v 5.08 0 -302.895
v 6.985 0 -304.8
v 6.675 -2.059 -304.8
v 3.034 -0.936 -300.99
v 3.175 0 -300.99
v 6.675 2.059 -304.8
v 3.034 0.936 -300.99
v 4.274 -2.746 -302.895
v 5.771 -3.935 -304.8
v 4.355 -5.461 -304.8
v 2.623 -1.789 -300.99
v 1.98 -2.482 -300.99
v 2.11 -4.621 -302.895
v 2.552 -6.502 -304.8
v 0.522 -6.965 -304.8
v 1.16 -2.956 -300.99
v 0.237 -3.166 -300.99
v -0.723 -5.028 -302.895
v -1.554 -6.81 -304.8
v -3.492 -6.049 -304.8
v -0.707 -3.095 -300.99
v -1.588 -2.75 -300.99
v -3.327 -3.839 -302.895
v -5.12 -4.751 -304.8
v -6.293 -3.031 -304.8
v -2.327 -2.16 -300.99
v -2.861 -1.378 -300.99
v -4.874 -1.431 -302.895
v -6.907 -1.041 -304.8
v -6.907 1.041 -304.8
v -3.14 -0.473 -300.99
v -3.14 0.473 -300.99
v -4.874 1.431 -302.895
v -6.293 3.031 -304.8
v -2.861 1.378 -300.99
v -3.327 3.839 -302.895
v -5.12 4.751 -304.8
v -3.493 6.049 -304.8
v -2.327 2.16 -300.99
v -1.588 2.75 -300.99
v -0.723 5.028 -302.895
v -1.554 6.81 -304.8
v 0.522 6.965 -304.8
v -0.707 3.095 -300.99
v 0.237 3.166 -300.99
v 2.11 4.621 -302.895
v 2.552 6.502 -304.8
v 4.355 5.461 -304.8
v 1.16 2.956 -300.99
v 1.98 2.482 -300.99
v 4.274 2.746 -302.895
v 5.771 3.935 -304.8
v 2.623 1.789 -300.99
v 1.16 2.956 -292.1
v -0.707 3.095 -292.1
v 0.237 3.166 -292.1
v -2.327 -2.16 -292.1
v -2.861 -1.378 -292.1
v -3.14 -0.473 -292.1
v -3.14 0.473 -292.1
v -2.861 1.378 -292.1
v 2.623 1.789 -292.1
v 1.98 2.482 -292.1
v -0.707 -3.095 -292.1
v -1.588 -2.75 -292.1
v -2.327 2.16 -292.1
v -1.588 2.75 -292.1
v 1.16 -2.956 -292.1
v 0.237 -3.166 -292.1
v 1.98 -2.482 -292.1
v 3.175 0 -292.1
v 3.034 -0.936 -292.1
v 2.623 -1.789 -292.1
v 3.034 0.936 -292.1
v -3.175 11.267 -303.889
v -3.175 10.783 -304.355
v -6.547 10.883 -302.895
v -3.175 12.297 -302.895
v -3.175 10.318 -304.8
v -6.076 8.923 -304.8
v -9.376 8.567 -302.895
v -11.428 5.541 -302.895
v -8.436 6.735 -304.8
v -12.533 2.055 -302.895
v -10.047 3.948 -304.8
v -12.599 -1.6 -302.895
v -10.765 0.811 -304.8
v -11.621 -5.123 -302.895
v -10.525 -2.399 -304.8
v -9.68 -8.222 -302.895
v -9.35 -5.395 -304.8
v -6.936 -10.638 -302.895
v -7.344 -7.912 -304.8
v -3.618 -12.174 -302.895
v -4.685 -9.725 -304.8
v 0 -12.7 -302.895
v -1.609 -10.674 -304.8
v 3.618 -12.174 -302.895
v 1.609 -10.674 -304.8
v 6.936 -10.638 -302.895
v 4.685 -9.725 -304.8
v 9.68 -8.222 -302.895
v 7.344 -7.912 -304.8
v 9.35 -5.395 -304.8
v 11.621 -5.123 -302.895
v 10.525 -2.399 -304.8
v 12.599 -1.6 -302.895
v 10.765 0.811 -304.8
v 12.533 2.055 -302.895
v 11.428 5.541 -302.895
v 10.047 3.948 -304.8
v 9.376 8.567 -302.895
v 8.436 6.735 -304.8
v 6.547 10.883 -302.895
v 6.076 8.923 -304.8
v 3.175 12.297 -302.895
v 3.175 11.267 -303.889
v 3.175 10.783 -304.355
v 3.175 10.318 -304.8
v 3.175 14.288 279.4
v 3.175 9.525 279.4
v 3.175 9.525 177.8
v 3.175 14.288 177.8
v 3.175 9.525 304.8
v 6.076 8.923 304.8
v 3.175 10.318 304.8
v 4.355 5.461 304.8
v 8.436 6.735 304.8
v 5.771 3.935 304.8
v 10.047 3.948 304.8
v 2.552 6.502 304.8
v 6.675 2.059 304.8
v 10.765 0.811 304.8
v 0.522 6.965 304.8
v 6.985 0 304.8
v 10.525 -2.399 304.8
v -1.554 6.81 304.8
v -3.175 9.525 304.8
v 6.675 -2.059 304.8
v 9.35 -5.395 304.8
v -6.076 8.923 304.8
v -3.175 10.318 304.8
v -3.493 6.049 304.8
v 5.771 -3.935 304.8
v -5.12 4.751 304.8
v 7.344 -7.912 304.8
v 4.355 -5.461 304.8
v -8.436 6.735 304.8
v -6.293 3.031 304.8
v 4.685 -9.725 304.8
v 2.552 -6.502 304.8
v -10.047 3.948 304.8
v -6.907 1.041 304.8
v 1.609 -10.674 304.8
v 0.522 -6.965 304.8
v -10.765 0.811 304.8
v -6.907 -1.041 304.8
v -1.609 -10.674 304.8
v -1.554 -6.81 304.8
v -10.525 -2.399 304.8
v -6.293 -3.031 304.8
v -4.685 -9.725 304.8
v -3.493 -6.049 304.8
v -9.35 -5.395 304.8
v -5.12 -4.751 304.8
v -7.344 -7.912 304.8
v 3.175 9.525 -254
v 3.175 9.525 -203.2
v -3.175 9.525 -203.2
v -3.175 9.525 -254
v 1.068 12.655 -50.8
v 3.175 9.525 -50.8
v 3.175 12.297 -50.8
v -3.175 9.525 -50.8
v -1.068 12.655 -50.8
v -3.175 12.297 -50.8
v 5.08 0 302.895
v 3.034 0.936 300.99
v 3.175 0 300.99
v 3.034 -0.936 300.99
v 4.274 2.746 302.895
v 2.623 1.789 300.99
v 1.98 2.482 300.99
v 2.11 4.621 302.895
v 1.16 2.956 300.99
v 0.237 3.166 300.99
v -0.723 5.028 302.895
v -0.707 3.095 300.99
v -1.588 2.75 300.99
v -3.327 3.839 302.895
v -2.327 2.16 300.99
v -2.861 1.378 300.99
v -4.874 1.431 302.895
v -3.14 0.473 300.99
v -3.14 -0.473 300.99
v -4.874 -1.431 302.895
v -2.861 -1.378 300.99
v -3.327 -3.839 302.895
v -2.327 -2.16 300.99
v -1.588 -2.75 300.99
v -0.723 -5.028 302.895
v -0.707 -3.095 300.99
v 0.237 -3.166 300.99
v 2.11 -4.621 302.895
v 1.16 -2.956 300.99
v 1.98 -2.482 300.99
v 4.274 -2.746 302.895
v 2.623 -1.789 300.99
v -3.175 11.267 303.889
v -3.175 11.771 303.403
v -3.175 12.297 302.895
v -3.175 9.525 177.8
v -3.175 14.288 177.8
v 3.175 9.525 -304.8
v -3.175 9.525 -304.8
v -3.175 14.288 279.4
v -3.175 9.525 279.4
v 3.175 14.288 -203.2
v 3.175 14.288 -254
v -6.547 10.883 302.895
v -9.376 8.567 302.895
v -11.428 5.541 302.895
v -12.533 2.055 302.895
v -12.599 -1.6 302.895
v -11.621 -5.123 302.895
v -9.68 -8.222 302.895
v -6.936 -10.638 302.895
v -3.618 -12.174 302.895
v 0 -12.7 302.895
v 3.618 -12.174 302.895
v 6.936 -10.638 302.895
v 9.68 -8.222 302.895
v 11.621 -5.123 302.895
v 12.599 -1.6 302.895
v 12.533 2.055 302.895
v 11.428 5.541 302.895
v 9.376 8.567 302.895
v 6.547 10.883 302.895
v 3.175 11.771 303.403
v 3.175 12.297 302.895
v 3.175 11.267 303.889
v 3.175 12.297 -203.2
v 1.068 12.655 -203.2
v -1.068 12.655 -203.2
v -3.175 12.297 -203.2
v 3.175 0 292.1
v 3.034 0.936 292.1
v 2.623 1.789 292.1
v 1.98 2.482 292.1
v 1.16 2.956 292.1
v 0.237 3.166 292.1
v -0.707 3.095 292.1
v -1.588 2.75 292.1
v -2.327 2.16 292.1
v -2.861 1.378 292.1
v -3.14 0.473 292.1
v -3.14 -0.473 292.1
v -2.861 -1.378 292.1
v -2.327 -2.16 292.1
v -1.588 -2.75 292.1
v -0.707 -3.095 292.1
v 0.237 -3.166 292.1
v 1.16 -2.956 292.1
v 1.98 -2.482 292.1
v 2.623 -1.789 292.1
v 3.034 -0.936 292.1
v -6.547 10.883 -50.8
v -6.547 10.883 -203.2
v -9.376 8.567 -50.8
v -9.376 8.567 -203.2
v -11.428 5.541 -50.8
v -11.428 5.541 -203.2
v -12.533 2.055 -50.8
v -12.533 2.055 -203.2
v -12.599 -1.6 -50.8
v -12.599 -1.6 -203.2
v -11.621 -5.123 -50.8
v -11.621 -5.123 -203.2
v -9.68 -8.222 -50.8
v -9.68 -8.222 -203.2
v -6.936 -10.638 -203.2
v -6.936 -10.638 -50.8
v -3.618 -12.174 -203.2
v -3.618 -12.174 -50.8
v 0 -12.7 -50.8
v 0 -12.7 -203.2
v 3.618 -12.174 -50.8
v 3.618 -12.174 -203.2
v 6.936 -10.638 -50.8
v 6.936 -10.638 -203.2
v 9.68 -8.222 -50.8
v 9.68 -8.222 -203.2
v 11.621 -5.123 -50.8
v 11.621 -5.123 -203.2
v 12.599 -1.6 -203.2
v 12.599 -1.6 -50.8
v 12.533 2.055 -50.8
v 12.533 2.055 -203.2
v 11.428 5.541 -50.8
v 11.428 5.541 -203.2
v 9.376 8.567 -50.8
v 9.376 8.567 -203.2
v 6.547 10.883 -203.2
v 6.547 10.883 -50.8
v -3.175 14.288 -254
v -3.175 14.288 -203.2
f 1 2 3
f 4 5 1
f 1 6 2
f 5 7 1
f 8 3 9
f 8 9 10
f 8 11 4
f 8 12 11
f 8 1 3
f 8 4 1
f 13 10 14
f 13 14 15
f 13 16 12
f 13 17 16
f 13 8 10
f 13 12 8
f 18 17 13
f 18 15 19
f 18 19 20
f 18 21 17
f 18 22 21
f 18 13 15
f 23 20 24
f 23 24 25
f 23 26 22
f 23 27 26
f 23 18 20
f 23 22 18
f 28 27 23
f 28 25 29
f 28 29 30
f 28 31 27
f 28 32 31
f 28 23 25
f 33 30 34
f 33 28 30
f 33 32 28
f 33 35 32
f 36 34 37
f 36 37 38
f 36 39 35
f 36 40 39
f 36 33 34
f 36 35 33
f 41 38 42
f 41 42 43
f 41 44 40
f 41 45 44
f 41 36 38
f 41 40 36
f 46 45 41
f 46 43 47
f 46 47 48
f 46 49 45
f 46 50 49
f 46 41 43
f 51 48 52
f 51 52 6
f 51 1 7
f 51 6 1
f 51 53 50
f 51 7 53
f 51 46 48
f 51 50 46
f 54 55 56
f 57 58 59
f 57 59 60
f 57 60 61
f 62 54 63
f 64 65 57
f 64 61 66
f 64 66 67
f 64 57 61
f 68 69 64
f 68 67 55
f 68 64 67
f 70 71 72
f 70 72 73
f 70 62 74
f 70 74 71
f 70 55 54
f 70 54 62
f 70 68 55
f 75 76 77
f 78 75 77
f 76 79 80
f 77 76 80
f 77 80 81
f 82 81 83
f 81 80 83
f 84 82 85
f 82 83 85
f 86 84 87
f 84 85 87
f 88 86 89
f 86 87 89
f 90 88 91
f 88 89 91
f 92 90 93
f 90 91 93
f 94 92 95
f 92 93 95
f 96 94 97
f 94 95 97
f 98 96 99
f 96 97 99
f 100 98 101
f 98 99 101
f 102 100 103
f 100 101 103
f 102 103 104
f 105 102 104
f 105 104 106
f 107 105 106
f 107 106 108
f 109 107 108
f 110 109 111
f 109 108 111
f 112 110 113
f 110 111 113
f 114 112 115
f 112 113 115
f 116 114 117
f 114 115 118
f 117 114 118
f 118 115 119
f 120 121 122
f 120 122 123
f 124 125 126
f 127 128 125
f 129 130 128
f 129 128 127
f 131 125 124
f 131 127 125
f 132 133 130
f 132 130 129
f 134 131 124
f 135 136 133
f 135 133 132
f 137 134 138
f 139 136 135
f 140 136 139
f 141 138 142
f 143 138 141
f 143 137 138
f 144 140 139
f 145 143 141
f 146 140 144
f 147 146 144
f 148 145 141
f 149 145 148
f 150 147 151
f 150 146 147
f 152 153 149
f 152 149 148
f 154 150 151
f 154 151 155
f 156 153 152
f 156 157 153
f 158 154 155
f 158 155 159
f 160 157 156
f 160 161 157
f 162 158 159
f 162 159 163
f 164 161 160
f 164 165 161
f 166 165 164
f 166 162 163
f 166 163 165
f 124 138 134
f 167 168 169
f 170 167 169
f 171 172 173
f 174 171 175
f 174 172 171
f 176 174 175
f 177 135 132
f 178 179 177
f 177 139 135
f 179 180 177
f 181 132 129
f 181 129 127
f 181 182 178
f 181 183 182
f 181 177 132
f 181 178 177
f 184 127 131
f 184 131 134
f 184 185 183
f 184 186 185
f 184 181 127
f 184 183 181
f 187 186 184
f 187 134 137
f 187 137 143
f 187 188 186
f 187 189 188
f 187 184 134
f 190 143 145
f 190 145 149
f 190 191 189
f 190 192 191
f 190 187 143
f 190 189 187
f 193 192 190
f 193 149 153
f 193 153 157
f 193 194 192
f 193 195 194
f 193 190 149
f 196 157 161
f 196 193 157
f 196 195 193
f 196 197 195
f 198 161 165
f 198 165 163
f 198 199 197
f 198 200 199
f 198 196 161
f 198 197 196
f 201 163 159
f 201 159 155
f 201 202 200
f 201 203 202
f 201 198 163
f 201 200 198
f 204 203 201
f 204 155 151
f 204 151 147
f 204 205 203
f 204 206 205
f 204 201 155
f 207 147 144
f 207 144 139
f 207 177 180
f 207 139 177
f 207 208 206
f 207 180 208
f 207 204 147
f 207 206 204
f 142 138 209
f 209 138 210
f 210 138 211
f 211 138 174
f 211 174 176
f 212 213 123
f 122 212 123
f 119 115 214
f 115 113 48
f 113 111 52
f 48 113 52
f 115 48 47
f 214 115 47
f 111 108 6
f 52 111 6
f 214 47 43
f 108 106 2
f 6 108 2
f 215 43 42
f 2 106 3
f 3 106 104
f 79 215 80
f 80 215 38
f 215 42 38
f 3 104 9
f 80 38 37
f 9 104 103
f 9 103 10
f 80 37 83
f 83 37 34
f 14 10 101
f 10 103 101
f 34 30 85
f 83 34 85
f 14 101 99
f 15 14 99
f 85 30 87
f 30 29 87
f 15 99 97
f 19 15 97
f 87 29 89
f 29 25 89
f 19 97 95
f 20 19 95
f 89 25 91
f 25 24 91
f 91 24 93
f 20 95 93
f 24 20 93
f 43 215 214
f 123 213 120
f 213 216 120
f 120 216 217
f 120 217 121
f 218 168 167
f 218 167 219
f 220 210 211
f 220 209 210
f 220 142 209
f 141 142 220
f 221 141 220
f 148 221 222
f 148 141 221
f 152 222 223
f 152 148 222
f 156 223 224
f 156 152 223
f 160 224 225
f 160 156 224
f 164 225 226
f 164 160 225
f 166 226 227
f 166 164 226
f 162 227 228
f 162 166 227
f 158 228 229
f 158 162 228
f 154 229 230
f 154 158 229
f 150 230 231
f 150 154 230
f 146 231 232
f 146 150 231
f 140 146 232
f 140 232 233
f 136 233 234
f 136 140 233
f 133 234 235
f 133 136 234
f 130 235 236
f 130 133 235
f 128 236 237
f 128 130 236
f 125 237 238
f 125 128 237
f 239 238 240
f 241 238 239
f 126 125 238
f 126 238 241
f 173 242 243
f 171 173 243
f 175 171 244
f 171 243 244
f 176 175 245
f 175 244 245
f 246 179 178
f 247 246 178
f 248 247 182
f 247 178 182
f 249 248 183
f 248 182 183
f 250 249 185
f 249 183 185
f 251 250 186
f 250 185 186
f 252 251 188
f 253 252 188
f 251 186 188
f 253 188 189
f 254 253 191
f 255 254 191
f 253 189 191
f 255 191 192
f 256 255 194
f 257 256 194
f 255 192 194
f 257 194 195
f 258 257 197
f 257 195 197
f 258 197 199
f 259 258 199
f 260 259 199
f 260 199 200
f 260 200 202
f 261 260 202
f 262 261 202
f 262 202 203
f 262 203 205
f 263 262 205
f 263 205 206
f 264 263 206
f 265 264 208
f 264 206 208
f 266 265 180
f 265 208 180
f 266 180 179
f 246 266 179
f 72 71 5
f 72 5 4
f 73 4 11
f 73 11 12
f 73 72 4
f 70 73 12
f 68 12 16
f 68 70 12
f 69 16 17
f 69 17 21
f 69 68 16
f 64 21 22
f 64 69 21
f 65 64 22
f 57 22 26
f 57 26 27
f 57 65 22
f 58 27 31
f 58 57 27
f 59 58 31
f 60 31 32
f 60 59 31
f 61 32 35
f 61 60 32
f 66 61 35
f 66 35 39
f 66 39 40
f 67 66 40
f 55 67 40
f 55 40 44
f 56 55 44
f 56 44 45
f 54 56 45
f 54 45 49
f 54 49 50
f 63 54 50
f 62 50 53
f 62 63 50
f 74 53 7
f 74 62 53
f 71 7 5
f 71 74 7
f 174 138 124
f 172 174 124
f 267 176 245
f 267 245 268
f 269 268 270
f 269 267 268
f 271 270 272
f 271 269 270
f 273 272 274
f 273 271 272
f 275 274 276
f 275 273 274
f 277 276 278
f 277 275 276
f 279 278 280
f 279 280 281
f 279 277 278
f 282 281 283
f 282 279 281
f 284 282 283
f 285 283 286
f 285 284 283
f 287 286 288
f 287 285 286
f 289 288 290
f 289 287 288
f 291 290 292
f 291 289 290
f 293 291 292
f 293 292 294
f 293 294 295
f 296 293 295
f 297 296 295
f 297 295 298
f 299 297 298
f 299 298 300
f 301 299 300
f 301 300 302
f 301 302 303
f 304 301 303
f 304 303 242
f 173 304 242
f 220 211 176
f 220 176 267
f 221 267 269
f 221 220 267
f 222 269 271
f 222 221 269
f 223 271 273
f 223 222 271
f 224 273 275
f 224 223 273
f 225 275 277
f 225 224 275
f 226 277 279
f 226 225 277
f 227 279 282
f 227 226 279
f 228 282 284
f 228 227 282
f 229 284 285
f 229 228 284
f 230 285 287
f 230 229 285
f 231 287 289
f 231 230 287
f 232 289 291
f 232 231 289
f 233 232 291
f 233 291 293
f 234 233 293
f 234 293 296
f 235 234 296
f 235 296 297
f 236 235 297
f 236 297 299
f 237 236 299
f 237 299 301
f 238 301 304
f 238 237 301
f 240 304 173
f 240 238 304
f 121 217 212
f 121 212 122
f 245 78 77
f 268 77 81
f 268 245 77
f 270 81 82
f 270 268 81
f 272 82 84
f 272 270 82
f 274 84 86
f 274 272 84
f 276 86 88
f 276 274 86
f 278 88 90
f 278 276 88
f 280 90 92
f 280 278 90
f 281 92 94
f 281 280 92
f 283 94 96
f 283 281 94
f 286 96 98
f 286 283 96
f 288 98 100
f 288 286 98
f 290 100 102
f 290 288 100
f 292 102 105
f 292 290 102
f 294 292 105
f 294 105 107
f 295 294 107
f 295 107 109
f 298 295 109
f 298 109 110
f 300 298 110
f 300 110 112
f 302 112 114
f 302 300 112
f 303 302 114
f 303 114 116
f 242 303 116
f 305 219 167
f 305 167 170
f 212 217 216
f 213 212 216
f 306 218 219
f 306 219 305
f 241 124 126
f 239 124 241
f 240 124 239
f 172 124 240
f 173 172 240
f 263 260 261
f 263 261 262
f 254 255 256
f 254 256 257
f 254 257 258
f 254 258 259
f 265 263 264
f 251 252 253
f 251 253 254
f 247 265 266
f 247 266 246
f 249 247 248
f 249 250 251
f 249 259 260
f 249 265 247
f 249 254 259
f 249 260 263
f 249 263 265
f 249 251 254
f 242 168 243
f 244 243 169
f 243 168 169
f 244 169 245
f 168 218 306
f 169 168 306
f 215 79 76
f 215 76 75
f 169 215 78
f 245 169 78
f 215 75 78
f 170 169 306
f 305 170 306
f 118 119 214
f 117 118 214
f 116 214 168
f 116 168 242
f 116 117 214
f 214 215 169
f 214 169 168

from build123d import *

# Parameters (mm, degrees)
SKETCH1_R           = 12.7
EXTRUDE1_DEPTH      = 304.8
CHAMFER1_SIZE       = 1.905
EXTRUDE2_DEPTH      = 306.328708116
EXTRUDE2_DEPTH_BACK = 306.328708116
SKETCH3_W           = 6.35
SKETCH3_H           = 3.175
EXTRUDE3_START      = -203.2
SKETCH1_2_R         = 12.7
EXTRUDE3_DEPTH      = 152.4
SKETCH5_W           = 6.35
SKETCH5_H           = 4.7625
EXTRUDE4_DEPTH      = 50.8
SKETCH6_W           = 6.35
SKETCH6_H           = 4.7625
EXTRUDE5_DEPTH      = 25.4
SKETCH7_R           = 3.175
CUT_EXTRUDE1_DEPTH  = 12.7
CUT_EXTRUDE2_START  = -12.7
SKETCH8_R           = 3.175
CUT_EXTRUDE2_DEPTH  = 12.7
CHAMFER2_SIZE       = 3.81


with BuildPart() as part:
    # Sketch1 → Extrude1 (new, symmetric)
    with BuildSketch(Plane.XY):
        with Locations(Location((0, 0, 0), (0, 0, 180))):
            Circle(SKETCH1_R)
    extrude(amount=EXTRUDE1_DEPTH, both=True)

    # Chamfer1
    chamfer1_edges = [part.edges().sort_by_distance(p)[0] for p in [
        (12.7, 0, -304.8),
        (12.7, 0, 304.8),
    ]]
    chamfer(chamfer1_edges, length=CHAMFER1_SIZE)

    # Sketch3 → Extrude2 (cut, two sides: drawn at the far end of the back side and taken through both)
    with BuildSketch(Plane.XY.offset(-EXTRUDE2_DEPTH_BACK)):
        with Locations((0, 11.1125)):
            Rectangle(SKETCH3_W, SKETCH3_H)
    extrude(amount=EXTRUDE2_DEPTH + EXTRUDE2_DEPTH_BACK, mode=Mode.SUBTRACT)

    # Sketch1<2> → Extrude3 (add)
    with BuildSketch(Plane.XY.offset(EXTRUDE3_START)):
        with Locations(Location((0, 0, 0), (0, 0, 104.477512186))):
            Circle(SKETCH1_2_R)
    extrude(amount=EXTRUDE3_DEPTH)

    # Sketch7 → Cut-Extrude1 (cut)
    with BuildSketch(Plane.XY.offset(304.8)):
        Circle(SKETCH7_R)
    extrude(amount=-CUT_EXTRUDE1_DEPTH, mode=Mode.SUBTRACT)

    # Sketch8 → Cut-Extrude2 (cut)
    with BuildSketch(Plane(origin=(0, 0, -304.8), x_dir=(-1, 0, 0), z_dir=(0, 0, -1)).offset(CUT_EXTRUDE2_START)):
        with Locations(Location((0, 0, 0), (0, 0, 180))):
            Circle(SKETCH8_R)
    extrude(amount=CUT_EXTRUDE2_DEPTH, mode=Mode.SUBTRACT)

    # Chamfer2
    chamfer2_edges = [part.edges().sort_by_distance(p)[0] for p in [
        (-3.175, 0, 304.8),
        (-3.175, 0, -304.8),
    ]]
    chamfer(chamfer2_edges, length=CHAMFER2_SIZE)


with BuildPart() as body_2:
    # Sketch5 → Extrude4 (new, symmetric)
    with BuildSketch(Plane.XY.offset(228.6)):
        with Locations((0, 11.90625)):
            Rectangle(SKETCH5_W, SKETCH5_H)
    extrude(amount=EXTRUDE4_DEPTH, both=True)


with BuildPart() as body_3:
    # Sketch6 → Extrude5 (new, symmetric)
    with BuildSketch(Plane(origin=(0, 0, -228.6), x_dir=(-1, 0, 0), z_dir=(0, 0, -1))):
        with Locations((0, 11.90625)):
            Rectangle(SKETCH6_W, SKETCH6_H)
    extrude(amount=EXTRUDE5_DEPTH, both=True)


solid = Compound([part.part, body_2.part, body_3.part])
